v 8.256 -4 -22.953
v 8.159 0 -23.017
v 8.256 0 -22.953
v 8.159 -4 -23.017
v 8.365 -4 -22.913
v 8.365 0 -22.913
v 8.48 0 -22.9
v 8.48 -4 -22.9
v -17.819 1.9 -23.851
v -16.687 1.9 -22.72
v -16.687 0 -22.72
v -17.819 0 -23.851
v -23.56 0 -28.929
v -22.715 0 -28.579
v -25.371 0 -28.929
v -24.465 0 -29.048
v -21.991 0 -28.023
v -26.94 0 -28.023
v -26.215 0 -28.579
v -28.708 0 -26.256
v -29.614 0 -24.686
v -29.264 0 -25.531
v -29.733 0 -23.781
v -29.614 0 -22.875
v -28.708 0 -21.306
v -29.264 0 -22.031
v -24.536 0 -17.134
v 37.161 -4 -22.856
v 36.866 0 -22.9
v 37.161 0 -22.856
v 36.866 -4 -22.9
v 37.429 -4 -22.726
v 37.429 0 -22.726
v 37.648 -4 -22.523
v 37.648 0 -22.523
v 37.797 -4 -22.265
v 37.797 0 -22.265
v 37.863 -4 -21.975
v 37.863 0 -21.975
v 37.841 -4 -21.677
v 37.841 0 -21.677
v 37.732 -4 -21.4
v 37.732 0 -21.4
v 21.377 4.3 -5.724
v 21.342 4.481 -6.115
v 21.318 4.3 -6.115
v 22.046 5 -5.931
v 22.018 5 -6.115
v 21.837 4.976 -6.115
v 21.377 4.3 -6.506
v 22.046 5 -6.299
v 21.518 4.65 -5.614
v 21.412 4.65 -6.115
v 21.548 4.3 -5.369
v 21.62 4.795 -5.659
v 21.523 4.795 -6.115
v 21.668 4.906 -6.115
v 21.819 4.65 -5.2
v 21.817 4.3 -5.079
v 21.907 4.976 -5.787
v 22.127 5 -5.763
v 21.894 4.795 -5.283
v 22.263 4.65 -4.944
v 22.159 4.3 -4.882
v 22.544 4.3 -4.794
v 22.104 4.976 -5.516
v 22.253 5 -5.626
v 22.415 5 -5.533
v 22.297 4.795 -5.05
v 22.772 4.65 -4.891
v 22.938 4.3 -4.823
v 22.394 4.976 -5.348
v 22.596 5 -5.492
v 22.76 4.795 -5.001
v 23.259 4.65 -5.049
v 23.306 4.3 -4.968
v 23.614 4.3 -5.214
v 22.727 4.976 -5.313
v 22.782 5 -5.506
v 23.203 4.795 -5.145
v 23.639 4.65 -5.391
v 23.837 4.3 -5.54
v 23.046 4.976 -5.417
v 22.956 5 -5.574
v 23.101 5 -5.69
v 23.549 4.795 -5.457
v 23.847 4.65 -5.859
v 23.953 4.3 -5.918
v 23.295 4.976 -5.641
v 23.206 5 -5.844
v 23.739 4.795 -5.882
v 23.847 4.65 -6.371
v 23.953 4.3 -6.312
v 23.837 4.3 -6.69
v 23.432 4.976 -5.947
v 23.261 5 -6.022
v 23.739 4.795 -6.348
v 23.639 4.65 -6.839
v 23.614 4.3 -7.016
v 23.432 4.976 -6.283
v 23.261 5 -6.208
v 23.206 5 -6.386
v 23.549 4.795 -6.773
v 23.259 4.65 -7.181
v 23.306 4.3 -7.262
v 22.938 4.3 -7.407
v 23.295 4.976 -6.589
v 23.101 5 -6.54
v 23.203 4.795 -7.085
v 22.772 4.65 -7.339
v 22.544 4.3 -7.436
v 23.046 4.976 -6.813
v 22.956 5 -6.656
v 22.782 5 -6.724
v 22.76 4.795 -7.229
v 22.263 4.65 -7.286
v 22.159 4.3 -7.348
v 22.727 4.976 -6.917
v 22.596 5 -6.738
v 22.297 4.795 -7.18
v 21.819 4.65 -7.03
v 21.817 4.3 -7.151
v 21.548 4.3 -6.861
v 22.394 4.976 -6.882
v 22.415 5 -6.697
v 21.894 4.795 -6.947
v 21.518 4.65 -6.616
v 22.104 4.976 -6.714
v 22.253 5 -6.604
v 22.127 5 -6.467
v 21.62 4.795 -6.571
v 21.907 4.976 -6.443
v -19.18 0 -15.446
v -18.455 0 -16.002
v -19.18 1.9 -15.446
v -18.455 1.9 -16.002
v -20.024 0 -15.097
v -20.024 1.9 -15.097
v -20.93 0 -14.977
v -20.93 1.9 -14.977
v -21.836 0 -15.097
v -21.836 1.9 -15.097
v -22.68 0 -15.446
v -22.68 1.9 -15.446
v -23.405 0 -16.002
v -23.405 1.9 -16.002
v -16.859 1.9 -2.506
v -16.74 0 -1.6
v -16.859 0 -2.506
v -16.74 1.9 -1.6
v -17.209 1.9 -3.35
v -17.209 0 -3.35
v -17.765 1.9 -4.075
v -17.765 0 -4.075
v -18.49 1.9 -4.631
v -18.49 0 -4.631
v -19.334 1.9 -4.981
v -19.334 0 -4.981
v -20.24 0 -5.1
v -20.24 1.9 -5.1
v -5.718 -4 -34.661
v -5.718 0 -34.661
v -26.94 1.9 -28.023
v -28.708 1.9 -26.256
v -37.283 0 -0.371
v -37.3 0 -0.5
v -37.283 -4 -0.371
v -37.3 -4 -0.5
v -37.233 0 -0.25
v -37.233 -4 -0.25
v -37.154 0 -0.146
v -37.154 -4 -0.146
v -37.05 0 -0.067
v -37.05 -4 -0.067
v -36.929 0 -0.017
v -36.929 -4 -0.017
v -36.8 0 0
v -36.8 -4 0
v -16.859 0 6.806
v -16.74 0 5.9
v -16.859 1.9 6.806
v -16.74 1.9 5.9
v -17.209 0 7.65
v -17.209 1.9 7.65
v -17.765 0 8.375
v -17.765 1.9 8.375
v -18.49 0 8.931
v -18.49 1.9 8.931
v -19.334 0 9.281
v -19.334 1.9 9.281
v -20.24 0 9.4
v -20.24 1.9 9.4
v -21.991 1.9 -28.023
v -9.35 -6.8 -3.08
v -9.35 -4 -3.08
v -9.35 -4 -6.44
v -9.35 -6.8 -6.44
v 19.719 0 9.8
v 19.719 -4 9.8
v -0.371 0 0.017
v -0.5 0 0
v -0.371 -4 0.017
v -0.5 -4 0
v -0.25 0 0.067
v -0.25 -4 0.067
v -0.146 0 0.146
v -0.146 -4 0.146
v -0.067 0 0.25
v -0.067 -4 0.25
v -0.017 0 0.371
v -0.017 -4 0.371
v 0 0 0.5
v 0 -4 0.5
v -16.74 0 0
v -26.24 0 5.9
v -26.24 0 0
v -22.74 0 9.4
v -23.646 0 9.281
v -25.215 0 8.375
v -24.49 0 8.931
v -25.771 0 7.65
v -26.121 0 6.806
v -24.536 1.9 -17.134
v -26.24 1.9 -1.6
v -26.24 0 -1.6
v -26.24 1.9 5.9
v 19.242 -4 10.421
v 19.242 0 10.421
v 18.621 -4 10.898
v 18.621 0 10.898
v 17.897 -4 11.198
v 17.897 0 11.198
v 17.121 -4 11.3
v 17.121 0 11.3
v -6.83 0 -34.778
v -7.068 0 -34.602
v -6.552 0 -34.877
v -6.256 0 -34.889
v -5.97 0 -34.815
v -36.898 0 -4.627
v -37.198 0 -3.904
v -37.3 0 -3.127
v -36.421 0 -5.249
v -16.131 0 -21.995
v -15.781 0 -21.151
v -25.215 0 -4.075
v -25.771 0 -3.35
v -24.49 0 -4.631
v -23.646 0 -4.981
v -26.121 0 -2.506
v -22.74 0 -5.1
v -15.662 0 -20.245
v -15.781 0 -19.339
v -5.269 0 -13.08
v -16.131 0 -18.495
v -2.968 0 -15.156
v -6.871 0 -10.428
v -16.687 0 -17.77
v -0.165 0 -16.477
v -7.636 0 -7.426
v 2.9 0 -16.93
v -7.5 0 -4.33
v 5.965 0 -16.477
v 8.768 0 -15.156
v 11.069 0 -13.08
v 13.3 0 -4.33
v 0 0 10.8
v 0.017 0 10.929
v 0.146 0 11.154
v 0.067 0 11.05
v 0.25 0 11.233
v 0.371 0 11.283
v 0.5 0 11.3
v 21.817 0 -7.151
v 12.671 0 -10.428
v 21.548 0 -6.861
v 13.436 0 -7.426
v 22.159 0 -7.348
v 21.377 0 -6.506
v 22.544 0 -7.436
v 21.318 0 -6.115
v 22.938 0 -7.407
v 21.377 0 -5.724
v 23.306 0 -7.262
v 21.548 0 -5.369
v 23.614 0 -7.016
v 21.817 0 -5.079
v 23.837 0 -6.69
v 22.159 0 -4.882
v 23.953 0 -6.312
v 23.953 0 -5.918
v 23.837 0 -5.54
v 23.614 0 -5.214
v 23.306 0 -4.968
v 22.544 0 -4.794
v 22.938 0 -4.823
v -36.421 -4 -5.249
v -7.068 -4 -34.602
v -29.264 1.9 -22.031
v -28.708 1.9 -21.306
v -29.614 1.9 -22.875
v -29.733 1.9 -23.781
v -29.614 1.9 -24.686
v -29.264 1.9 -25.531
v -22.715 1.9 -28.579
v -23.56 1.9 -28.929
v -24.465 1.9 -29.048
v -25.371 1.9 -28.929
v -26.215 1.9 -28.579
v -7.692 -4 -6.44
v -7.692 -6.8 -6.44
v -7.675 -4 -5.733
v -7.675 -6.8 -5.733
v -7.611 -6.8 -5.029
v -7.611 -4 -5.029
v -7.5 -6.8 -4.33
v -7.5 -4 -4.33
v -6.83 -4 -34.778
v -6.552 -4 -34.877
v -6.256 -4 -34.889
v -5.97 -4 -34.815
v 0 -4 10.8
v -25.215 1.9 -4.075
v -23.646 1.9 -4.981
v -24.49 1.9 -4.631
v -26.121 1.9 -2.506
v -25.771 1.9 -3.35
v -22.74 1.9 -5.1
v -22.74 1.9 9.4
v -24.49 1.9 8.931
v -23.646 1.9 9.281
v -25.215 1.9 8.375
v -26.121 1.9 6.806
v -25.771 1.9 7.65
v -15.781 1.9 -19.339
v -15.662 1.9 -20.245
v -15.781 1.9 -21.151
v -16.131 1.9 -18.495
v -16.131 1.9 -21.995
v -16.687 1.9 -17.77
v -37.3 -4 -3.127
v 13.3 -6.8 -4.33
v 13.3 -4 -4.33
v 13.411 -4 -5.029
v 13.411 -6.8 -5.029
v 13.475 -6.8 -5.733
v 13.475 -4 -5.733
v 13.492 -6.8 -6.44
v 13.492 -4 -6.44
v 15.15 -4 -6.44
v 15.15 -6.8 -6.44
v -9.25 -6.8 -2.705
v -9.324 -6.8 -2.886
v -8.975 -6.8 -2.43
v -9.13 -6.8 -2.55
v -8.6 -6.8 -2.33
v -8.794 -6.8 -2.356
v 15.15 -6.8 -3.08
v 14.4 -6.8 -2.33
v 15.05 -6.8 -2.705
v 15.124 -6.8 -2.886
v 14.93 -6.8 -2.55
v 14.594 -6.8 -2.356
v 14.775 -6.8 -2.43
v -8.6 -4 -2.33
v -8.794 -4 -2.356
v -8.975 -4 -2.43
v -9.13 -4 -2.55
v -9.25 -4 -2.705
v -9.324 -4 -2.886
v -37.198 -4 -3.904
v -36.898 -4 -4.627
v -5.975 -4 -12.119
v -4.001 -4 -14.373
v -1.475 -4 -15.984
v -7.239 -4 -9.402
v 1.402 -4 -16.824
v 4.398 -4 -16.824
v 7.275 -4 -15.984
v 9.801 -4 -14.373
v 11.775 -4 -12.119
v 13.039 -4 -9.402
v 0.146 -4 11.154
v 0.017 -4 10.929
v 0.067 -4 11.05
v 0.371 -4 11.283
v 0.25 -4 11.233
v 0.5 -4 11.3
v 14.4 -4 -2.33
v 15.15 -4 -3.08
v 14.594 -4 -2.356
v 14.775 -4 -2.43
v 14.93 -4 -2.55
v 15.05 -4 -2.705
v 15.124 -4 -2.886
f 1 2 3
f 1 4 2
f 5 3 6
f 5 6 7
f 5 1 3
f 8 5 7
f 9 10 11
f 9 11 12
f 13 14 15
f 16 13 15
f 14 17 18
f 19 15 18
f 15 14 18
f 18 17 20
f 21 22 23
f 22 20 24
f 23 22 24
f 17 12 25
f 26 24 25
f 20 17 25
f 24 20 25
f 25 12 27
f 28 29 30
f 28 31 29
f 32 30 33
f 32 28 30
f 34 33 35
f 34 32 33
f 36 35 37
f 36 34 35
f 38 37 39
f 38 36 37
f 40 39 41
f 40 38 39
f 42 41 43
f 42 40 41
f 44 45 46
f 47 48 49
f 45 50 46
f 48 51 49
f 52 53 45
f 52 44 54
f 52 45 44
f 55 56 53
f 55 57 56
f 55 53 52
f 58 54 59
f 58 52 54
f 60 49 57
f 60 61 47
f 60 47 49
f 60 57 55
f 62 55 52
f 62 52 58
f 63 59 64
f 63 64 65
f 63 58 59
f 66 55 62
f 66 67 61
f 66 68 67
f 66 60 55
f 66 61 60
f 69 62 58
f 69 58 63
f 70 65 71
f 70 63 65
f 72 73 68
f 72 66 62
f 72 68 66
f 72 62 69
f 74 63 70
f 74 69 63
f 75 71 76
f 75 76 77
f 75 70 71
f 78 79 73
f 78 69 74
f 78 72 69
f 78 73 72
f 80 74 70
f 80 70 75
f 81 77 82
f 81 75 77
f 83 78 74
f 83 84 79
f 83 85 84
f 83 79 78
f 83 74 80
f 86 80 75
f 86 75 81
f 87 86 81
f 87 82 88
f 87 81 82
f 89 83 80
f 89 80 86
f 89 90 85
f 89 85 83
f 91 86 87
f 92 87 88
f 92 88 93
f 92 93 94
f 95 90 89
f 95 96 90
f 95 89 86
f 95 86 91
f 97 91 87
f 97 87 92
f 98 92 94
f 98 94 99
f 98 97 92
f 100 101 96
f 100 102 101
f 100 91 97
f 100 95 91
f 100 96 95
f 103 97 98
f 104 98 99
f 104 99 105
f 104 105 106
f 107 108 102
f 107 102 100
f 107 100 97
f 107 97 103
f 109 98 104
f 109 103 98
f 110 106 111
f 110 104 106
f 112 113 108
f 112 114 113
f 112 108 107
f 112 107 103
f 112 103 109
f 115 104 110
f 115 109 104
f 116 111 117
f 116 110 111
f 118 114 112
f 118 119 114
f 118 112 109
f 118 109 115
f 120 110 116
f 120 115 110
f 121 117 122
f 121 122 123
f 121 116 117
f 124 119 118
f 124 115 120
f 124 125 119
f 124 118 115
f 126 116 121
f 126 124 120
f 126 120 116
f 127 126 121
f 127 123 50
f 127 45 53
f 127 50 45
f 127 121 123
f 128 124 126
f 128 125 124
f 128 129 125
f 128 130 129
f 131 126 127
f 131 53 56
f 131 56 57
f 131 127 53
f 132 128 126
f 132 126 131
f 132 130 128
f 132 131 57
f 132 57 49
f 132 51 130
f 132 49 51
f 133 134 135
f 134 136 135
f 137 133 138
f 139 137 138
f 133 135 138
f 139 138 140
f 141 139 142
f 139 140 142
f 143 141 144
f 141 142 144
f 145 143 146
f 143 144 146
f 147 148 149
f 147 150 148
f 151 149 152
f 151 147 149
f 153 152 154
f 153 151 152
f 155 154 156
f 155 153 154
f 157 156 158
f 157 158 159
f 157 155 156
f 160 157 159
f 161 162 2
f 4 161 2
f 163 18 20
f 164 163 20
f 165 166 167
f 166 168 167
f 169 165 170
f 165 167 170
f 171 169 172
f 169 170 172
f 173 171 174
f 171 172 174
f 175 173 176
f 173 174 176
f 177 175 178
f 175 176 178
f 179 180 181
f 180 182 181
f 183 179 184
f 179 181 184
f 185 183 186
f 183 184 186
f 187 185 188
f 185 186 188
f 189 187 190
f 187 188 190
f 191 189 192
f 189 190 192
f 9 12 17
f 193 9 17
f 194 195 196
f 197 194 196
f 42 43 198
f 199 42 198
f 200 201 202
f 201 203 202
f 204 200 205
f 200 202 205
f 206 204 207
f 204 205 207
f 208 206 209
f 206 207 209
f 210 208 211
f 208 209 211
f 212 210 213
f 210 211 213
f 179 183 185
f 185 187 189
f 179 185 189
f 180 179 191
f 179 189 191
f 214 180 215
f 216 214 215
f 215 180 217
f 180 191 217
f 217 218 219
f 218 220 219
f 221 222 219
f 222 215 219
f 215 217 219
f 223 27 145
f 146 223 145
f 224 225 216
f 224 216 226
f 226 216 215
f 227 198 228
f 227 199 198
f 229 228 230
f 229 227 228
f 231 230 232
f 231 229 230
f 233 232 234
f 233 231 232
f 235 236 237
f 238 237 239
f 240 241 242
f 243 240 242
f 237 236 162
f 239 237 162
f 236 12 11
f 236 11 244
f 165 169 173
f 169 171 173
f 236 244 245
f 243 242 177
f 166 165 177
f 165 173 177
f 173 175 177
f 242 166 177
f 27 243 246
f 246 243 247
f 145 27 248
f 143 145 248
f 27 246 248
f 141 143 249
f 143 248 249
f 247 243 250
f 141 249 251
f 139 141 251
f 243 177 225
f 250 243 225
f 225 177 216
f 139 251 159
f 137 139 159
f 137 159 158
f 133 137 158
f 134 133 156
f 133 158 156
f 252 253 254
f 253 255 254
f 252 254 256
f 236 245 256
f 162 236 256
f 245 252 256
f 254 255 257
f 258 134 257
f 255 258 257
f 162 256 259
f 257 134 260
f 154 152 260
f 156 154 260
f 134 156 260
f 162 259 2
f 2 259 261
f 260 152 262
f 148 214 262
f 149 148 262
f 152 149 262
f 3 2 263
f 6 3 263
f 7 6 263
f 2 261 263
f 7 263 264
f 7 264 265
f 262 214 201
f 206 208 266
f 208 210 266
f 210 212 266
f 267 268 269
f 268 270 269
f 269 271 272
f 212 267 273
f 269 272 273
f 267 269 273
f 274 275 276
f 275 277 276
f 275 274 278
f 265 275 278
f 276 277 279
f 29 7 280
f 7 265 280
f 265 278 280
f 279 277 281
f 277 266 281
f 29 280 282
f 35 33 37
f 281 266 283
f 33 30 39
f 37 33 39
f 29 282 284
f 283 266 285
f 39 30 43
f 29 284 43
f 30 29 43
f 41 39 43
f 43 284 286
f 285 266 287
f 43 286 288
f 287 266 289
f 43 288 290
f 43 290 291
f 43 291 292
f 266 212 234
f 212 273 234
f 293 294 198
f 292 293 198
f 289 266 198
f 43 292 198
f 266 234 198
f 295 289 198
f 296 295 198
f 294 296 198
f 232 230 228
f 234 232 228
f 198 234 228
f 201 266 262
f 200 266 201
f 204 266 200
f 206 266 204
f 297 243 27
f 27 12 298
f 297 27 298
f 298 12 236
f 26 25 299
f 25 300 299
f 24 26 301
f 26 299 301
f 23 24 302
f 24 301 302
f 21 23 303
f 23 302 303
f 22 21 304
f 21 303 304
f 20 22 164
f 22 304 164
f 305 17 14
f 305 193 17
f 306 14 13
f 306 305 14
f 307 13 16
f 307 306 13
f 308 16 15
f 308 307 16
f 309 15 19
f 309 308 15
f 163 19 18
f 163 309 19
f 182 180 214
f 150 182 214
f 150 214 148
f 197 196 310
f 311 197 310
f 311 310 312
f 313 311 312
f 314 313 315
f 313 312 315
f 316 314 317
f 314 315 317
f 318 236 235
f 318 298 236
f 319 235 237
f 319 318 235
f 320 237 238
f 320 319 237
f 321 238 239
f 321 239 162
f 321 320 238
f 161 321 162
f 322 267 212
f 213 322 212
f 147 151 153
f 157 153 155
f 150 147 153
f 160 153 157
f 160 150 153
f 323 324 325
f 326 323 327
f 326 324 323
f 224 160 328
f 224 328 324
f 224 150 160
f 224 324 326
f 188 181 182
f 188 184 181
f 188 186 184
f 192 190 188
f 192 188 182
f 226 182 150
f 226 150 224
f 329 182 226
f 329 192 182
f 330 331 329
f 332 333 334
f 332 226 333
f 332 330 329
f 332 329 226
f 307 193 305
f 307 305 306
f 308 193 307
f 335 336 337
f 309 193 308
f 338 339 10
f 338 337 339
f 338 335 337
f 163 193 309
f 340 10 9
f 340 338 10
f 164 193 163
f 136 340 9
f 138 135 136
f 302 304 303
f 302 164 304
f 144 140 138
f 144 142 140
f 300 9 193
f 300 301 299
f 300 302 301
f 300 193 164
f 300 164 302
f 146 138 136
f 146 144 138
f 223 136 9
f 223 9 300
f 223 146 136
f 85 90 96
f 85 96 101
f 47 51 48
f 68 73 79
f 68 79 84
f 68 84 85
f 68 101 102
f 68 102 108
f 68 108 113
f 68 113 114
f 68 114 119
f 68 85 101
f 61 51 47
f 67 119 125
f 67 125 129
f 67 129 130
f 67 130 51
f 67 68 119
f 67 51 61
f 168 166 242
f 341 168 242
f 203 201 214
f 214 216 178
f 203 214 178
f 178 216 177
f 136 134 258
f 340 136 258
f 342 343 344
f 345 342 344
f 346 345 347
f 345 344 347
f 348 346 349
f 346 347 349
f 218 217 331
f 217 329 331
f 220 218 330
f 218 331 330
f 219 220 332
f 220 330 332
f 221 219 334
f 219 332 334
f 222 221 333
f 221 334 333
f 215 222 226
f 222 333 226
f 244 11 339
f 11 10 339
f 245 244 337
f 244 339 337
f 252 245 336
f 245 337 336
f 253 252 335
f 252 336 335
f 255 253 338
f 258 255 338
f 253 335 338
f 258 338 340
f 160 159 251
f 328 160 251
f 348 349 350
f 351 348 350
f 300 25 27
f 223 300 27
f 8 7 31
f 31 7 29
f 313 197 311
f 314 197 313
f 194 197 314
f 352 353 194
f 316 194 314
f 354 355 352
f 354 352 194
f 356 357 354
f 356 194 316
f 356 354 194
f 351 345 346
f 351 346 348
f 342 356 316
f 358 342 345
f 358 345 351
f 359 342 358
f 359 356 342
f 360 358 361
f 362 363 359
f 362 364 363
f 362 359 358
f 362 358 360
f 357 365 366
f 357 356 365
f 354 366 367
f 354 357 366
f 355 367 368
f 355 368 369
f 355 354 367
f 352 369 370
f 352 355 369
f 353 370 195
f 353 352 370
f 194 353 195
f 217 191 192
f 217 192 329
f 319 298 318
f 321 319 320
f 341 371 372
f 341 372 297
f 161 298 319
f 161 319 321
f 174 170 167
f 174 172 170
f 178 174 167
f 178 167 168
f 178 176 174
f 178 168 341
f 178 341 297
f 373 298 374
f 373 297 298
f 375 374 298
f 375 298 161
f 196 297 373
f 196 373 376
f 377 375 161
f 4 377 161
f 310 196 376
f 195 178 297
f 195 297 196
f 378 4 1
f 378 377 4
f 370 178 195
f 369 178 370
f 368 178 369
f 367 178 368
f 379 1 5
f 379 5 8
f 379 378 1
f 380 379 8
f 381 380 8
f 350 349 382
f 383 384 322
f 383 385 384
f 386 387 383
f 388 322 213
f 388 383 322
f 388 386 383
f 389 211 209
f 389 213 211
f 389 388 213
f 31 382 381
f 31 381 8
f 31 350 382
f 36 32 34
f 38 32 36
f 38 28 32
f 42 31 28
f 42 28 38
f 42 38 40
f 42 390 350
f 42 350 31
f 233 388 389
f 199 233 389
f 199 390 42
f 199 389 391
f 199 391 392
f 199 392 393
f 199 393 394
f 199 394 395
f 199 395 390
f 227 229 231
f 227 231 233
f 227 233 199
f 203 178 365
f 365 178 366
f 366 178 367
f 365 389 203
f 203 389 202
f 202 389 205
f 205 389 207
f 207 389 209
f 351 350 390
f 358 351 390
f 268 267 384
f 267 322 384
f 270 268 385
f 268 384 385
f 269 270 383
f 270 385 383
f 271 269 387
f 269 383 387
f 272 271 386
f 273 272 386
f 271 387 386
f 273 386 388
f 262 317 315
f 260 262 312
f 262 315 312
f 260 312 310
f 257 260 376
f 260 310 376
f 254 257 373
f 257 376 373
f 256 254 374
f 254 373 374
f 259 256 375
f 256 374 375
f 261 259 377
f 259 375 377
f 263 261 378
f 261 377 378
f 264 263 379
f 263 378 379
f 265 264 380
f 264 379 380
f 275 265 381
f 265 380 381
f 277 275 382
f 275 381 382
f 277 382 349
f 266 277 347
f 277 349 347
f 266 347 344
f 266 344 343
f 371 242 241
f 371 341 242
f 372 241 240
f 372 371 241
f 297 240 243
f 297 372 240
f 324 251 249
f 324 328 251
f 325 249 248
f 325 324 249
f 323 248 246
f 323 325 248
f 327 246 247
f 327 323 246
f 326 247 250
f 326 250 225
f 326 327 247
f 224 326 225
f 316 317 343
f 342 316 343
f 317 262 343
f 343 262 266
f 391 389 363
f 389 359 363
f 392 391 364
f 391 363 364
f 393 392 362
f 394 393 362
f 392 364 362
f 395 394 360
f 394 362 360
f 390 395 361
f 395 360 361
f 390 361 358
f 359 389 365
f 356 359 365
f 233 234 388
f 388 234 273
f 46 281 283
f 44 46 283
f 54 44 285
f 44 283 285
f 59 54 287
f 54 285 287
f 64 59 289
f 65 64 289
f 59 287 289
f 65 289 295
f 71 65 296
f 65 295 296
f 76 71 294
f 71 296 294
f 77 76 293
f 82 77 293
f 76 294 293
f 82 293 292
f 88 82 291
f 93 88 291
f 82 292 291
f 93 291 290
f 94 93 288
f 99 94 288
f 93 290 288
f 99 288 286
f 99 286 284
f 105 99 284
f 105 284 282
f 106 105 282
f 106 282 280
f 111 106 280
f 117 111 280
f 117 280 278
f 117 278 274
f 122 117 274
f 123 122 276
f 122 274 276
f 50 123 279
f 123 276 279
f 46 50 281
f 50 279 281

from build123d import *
from build123d import SkipClean  # not in build123d's __all__

# Parameters (mm, degrees)
F1_DEPTH  = 4
F2_R      = 3
F3_R      = 1
F4_R      = 0.5
F6_DEPTH  = 25
F8_DEPTH  = 2.8
F9_R      = 0.75
F10_W     = 9.5
F10_H     = 9.4
F10_H_2   = 5.1
F11_DEPTH = 1.9
F12_R     = 3.5
F13_R     = 1.325
F14_DEPTH = 5
F15_R     = 0.7


# Not quite as in the source:
# - after a boolean that leaves OpenCascade's solid faulty, fix() repairs it


with BuildPart() as f1:
    # F0 (on Front) → F1 (new body)
    with BuildSketch(Plane.XZ):
        Polygon((0, 11.3), (0, 0), (-37.3, 0), (-37.3, -4.37), (-6.42, -35.25), (8.2981568685, -22.9), (38.5981568685, -22.9), (18.8527776623, 11.3), align=None)
    extrude(amount=F1_DEPTH)

    # F2
    f2_edges = [f1.edges().sort_by_distance(p)[0] for p in [
        (-37.3, -2, -4.37),
        (18.852778, -2, 11.3),
    ]]
    fillet(f2_edges, radius=F2_R)

    # F3
    f3_edges = [f1.edges().sort_by_distance(p)[0] for p in [
        (38.598157, -2, -22.9),
        (-6.42, -2, -35.25),
    ]]
    fillet(f3_edges, radius=F3_R)

    # F4
    f4_edges = [f1.edges().sort_by_distance(p)[0] for p in [
        (8.298157, -2, -22.9),
        (0, -2, 0),
        (0, -2, 11.3),
        (-37.3, -2, 0),
    ]]
    fillet(f4_edges, radius=F4_R)

    # F5 (on face) → F6 (cut)
    with BuildSketch(Plane.XZ.offset(4)):
        with BuildLine():
            Line((13.3, -4.33), (-7.5, -4.33))
            ThreePointArc((-7.5, -4.33), (2.9, -16.93), (13.3, -4.33))
        make_face()
    extrude(amount=-F6_DEPTH, mode=Mode.SUBTRACT)

    # F7 (on face) → F8 (join)
    with BuildSketch(Plane.XZ.offset(4)):
        with BuildLine():
            Line((15.15, -2.33), (-9.35, -2.33))
            Line((-9.35, -2.33), (-9.35, -6.44))
            Line((-9.35, -6.44), (-7.6915717466, -6.44))
            ThreePointArc((-7.6915717466, -6.44), (-7.6486750873, -5.3801980668), (-7.5, -4.33))
            Line((-7.5, -4.33), (13.3, -4.33))
            ThreePointArc((13.3, -4.33), (13.4486750873, -5.3801980668), (13.4915717466, -6.44))
            Line((13.4915717466, -6.44), (15.15, -6.44))
            Line((15.15, -6.44), (15.15, -2.33))
        make_face()
    with SkipClean():  # cleaning this boolean's faces spoils the solid; the shape is the same uncleaned
        extrude(amount=F8_DEPTH)

    # F9
    f9_edges = [f1.edges().sort_by_distance(p)[0] for p in [
        (-9.35, -5.4, -2.33),
        (15.15, -5.4, -2.33),
    ]]
    fillet(f9_edges, radius=F9_R)

    # F10 (on face) → F11 (join)
    with BuildSketch(Plane(origin=(0, 0, 0), x_dir=(-1, 0, 0), z_dir=(0, 1, 0))):
        with Locations((21.49, 4.7)):
            Rectangle(F10_W, F10_H)
        with Locations((21.49, -2.55)):
            Rectangle(F10_W, F10_H_2)
        Polygon((17.8186578158, -23.8513421842), (24.5361722371, -17.1338277629), (20.929927653, -13.5275831789), (14.2124132317, -20.2450976002), align=None)
        Polygon((31.1829759802, -23.7806315061), (24.5361722371, -17.1338277629), (17.8186578158, -23.8513421842), (24.4654615589, -30.4981459274), align=None)
    extrude(amount=F11_DEPTH)

    add(f1.part.fix(), mode=Mode.REPLACE)

    # F12
    f12_edges = [f1.edges().sort_by_distance(p)[0] for p in [
        (-24.465462, 0.95, -30.498146),
        (-31.182976, 0.95, -23.780632),
        (-14.212413, 0.95, -20.245098),
        (-20.929928, 0.95, -13.527583),
        (-26.24, 0.95, 9.4),
        (-16.74, 0.95, 9.4),
        (-26.24, 0.95, -5.1),
        (-16.74, 0.95, -5.1),
    ]]
    fillet(f12_edges, radius=F12_R)

    # F13 (on face) → F14 (join)
    with BuildSketch(Plane(origin=(0, 0, 0), x_dir=(-1, 0, 0), z_dir=(0, 1, 0))):
        with Locations((-22.6430821795, -6.115)):
            Circle(F13_R)
    extrude(amount=F14_DEPTH)

    # F15
    f15_edges = [f1.edges().sort_by_distance(p)[0] for p in [
        (23.968082, 5, -6.115),
    ]]
    fillet(f15_edges, radius=F15_R)


solid = f1.part
